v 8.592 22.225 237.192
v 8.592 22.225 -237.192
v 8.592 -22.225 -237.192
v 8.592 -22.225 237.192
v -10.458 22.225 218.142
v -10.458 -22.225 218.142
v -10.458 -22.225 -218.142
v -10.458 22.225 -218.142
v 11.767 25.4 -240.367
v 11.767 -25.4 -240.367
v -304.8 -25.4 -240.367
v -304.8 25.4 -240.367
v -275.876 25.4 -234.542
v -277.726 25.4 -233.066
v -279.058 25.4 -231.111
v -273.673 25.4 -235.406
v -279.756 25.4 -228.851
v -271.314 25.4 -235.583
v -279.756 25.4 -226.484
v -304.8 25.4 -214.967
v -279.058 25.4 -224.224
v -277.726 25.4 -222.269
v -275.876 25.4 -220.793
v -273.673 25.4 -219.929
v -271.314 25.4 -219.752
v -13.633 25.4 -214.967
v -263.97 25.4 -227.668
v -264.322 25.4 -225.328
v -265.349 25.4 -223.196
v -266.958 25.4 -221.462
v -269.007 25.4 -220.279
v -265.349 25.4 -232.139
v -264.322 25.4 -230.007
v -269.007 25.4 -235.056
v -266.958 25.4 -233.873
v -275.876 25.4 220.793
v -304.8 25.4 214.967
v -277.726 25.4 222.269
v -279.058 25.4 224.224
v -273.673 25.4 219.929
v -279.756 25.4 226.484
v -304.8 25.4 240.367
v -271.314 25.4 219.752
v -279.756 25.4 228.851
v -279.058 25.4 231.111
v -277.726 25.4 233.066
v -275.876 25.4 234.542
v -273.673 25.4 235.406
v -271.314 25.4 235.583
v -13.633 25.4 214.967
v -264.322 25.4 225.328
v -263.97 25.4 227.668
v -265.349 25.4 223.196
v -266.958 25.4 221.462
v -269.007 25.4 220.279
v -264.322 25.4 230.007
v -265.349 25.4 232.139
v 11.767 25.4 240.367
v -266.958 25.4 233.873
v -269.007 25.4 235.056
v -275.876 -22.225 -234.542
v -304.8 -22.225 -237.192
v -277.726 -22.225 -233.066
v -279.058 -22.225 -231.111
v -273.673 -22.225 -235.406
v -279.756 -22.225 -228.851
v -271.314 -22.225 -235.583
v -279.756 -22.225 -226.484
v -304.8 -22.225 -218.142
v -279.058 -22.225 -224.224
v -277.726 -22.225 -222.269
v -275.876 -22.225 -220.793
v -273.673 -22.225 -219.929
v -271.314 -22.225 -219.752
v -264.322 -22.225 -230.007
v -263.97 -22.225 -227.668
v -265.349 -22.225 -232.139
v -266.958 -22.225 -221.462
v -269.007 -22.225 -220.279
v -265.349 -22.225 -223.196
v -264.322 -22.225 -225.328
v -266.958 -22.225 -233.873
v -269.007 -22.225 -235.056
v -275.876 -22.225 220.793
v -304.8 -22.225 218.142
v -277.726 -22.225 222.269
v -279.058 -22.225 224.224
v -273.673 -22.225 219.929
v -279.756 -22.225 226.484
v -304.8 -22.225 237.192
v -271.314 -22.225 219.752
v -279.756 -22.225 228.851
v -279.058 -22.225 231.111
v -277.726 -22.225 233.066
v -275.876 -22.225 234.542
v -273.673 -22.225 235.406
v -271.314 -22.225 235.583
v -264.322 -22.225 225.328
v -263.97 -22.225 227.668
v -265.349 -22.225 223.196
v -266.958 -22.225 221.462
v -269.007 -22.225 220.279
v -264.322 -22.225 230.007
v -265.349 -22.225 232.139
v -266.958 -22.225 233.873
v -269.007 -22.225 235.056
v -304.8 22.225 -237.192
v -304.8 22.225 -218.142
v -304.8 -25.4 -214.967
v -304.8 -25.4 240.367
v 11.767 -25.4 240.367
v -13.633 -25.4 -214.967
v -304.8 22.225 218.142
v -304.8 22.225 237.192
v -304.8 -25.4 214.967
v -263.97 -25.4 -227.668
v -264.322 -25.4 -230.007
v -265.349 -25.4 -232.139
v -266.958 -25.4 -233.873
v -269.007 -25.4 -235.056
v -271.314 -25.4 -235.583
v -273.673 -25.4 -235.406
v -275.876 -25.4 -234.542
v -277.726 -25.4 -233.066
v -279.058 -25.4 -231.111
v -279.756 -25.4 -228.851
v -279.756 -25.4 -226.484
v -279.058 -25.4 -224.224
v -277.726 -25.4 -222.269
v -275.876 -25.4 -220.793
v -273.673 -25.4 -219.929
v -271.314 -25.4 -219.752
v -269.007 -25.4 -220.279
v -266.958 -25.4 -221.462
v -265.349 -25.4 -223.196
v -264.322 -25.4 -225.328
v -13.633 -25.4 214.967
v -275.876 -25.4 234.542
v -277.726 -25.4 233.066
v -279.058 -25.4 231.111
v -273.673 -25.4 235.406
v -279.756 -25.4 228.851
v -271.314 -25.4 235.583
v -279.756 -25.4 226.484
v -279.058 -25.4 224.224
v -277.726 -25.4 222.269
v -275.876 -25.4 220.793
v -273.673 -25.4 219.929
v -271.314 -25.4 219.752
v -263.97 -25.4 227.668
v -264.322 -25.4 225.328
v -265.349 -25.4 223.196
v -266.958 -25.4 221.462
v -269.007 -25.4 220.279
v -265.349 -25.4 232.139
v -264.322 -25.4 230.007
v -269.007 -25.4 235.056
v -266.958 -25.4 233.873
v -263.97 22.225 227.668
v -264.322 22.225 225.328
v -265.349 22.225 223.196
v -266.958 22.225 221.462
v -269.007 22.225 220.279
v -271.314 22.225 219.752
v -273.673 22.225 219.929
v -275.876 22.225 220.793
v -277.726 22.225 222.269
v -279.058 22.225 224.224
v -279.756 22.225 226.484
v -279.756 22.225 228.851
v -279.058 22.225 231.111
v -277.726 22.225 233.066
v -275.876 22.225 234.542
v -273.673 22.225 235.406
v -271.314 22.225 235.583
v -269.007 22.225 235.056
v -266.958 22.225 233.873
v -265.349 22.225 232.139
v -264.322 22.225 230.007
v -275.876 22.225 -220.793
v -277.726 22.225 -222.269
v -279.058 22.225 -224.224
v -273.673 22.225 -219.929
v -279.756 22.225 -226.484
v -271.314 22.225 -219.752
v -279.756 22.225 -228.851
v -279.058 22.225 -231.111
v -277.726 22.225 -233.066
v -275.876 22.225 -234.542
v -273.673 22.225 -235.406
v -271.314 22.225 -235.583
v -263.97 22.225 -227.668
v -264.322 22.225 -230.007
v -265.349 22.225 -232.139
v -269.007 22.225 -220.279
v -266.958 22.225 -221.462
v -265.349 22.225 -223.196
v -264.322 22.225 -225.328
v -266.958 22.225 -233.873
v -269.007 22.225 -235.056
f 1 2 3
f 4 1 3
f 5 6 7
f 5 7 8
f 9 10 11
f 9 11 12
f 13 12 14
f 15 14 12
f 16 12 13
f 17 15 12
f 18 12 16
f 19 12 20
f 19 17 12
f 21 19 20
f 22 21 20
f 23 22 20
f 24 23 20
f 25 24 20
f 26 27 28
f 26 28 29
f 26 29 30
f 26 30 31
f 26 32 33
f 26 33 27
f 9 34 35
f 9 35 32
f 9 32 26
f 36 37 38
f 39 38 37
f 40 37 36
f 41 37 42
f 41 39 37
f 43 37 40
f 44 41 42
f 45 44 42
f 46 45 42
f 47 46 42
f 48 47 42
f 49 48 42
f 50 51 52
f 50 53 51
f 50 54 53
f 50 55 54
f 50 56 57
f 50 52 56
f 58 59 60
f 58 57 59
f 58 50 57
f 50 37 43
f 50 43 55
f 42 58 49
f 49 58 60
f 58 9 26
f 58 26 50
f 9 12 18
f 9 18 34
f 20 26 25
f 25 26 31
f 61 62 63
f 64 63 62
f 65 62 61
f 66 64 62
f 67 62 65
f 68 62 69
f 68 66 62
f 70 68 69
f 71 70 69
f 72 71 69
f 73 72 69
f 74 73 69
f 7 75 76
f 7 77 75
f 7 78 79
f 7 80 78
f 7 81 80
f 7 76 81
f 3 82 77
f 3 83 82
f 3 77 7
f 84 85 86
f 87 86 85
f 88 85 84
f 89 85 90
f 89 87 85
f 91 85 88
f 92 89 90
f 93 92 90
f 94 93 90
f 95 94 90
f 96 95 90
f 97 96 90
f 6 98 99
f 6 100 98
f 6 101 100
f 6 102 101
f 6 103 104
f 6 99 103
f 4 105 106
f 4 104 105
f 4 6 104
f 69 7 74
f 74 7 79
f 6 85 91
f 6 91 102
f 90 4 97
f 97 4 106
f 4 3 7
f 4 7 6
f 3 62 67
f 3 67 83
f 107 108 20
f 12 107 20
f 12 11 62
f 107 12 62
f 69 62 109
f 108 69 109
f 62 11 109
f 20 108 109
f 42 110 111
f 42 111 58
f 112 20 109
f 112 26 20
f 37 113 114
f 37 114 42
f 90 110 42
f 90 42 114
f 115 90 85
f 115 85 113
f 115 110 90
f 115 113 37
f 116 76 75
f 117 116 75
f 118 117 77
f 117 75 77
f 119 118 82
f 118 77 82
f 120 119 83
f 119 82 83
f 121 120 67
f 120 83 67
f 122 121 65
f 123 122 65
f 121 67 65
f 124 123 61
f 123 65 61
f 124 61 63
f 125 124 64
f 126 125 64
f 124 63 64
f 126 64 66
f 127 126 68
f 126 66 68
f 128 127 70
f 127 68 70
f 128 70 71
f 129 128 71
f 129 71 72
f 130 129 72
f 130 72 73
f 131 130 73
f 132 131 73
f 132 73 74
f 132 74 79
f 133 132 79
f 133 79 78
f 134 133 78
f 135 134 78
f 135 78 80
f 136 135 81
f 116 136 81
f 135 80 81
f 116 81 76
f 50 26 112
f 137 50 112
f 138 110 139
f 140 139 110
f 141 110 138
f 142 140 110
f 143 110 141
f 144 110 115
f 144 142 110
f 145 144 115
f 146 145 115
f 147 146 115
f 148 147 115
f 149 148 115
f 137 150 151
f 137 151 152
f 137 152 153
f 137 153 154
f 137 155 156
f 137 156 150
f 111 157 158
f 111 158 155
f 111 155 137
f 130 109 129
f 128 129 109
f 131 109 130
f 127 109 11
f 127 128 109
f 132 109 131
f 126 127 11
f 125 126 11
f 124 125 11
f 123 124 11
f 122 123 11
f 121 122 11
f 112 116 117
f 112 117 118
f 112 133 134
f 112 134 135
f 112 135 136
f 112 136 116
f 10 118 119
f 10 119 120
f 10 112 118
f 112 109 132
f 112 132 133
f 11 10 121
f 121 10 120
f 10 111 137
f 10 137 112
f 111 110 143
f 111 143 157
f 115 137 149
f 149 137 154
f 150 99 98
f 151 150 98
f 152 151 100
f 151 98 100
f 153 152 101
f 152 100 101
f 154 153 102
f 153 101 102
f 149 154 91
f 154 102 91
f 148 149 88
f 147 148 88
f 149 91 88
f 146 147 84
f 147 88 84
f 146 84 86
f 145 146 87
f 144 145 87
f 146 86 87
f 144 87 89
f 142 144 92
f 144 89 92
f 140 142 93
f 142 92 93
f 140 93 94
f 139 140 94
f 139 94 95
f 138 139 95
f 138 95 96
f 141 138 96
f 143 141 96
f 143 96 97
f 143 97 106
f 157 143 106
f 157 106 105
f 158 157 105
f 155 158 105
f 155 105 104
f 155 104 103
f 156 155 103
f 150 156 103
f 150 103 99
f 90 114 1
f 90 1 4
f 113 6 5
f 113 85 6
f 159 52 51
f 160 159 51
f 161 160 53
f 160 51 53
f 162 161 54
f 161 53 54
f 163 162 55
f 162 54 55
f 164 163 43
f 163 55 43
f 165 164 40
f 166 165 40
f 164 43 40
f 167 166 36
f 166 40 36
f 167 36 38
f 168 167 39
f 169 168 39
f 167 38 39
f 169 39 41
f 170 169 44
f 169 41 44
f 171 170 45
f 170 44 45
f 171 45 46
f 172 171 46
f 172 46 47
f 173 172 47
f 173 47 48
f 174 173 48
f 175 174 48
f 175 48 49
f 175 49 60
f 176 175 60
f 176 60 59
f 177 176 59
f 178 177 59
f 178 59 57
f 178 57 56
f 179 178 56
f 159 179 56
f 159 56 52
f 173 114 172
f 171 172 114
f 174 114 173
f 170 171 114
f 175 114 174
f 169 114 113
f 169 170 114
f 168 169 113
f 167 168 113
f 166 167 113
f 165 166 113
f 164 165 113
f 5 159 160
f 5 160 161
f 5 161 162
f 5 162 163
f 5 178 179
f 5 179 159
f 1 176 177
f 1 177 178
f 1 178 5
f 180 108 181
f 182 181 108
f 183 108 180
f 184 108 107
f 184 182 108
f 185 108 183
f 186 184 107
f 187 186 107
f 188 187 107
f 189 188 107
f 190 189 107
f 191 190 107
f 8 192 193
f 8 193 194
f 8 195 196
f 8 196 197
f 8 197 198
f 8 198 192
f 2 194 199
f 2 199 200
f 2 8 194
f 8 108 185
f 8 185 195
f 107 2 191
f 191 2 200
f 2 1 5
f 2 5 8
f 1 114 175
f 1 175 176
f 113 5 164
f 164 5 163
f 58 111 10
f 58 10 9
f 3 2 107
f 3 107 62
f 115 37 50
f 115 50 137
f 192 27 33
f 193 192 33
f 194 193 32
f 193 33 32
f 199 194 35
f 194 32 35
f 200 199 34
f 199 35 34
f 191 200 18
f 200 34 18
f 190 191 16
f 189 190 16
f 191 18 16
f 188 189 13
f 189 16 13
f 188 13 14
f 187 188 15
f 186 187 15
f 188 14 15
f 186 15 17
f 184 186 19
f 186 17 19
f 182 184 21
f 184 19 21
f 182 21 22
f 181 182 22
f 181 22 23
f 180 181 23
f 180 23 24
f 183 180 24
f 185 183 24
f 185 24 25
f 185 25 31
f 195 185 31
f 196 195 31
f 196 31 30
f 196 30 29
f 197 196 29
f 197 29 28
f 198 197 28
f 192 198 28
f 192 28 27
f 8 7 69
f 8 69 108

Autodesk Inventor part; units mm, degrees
ref_plane "XZ Plane" through (0, 0, 0) normal (0, 1, 0) x (-1, 0, 0)
ref_plane "XY Plane" through (0, 0, 0) normal (0, 0, 1) x (1, 0, 0)
sketch "Sketch1" plane through (0, 0, 0) normal (0, 1, 0) x (-1, 0, 0)
  line L0 (304.8, -228.6) -> (0, -228.6)
  line L1 (0, -228.6) -> (0, 0)
  line L2 (0, 0) -> (304.8, 0) construction
  line L3 (304.8, 228.6) -> (0, 228.6)
  line L4 (0, 228.6) -> (0, 0)
  dimension "d0" = 304.8
  dimension "d1" = 228.6
ref_plane "Work Plane1" through (-304.8, 0, 0) normal (1, 0, 0) x (0, 1, 0)
sketch "Sketch2" plane through (-304.8, 0, 0) normal (1, 0, 0) x (0, 1, 0)
  line L0 (-25.4, -240.3674) -> (-25.4, -214.9674)
  line L1 (-25.4, -214.9674) -> (25.4, -214.9674)
  line L2 (25.4, -214.9674) -> (25.4, -240.3674)
  line L3 (25.4, -240.3674) -> (-25.4, -240.3674)
  line L4 (-25.4, -240.3674) -> (25.4, -214.9674) construction
  line L5 (-25.4, -214.9674) -> (25.4, -240.3674) construction
  line L6 (-22.225, -237.1924) -> (-22.225, -218.1424)
  line L7 (-22.225, -218.1424) -> (22.225, -218.1424)
  line L8 (22.225, -218.1424) -> (22.225, -237.1924)
  line L9 (22.225, -237.1924) -> (-22.225, -237.1924)
  line L10 (-22.225, -237.1924) -> (22.225, -218.1424) construction
  line L11 (-22.225, -218.1424) -> (22.225, -237.1924) construction
  point P0 (0, 0)
  point P1 (0, -227.6674)
  dimension "d3" = 25.4
  dimension "d4" = 50.8
  dimension "d5" = 3.175
  dimension "d6" = 3.175
sweep "Sweep1" add profiles "Sketch2" path "Sketch1"
sketch "Sketch3" plane through (-304.8, 25.4, -214.9674) normal (0, 1, 0) x (1, 0, 0)
  circle A0 centre (32.893, -442.6349) radius 7.9375
  line L0 (0, -455.3349) -> (0, -429.9349) projected
  point P0 (304.8, -214.9674)
  dimension "d9" = 15.875
  dimension "d10" = 32.893
extrude "Extrusion1" cut sketch "Sketch3" against normal through all
mirror "Mirror1" about plane through (0, 0, 0) normal (0, 0, 1) of "Extrusion1"
properties part number "GripperFrame"
